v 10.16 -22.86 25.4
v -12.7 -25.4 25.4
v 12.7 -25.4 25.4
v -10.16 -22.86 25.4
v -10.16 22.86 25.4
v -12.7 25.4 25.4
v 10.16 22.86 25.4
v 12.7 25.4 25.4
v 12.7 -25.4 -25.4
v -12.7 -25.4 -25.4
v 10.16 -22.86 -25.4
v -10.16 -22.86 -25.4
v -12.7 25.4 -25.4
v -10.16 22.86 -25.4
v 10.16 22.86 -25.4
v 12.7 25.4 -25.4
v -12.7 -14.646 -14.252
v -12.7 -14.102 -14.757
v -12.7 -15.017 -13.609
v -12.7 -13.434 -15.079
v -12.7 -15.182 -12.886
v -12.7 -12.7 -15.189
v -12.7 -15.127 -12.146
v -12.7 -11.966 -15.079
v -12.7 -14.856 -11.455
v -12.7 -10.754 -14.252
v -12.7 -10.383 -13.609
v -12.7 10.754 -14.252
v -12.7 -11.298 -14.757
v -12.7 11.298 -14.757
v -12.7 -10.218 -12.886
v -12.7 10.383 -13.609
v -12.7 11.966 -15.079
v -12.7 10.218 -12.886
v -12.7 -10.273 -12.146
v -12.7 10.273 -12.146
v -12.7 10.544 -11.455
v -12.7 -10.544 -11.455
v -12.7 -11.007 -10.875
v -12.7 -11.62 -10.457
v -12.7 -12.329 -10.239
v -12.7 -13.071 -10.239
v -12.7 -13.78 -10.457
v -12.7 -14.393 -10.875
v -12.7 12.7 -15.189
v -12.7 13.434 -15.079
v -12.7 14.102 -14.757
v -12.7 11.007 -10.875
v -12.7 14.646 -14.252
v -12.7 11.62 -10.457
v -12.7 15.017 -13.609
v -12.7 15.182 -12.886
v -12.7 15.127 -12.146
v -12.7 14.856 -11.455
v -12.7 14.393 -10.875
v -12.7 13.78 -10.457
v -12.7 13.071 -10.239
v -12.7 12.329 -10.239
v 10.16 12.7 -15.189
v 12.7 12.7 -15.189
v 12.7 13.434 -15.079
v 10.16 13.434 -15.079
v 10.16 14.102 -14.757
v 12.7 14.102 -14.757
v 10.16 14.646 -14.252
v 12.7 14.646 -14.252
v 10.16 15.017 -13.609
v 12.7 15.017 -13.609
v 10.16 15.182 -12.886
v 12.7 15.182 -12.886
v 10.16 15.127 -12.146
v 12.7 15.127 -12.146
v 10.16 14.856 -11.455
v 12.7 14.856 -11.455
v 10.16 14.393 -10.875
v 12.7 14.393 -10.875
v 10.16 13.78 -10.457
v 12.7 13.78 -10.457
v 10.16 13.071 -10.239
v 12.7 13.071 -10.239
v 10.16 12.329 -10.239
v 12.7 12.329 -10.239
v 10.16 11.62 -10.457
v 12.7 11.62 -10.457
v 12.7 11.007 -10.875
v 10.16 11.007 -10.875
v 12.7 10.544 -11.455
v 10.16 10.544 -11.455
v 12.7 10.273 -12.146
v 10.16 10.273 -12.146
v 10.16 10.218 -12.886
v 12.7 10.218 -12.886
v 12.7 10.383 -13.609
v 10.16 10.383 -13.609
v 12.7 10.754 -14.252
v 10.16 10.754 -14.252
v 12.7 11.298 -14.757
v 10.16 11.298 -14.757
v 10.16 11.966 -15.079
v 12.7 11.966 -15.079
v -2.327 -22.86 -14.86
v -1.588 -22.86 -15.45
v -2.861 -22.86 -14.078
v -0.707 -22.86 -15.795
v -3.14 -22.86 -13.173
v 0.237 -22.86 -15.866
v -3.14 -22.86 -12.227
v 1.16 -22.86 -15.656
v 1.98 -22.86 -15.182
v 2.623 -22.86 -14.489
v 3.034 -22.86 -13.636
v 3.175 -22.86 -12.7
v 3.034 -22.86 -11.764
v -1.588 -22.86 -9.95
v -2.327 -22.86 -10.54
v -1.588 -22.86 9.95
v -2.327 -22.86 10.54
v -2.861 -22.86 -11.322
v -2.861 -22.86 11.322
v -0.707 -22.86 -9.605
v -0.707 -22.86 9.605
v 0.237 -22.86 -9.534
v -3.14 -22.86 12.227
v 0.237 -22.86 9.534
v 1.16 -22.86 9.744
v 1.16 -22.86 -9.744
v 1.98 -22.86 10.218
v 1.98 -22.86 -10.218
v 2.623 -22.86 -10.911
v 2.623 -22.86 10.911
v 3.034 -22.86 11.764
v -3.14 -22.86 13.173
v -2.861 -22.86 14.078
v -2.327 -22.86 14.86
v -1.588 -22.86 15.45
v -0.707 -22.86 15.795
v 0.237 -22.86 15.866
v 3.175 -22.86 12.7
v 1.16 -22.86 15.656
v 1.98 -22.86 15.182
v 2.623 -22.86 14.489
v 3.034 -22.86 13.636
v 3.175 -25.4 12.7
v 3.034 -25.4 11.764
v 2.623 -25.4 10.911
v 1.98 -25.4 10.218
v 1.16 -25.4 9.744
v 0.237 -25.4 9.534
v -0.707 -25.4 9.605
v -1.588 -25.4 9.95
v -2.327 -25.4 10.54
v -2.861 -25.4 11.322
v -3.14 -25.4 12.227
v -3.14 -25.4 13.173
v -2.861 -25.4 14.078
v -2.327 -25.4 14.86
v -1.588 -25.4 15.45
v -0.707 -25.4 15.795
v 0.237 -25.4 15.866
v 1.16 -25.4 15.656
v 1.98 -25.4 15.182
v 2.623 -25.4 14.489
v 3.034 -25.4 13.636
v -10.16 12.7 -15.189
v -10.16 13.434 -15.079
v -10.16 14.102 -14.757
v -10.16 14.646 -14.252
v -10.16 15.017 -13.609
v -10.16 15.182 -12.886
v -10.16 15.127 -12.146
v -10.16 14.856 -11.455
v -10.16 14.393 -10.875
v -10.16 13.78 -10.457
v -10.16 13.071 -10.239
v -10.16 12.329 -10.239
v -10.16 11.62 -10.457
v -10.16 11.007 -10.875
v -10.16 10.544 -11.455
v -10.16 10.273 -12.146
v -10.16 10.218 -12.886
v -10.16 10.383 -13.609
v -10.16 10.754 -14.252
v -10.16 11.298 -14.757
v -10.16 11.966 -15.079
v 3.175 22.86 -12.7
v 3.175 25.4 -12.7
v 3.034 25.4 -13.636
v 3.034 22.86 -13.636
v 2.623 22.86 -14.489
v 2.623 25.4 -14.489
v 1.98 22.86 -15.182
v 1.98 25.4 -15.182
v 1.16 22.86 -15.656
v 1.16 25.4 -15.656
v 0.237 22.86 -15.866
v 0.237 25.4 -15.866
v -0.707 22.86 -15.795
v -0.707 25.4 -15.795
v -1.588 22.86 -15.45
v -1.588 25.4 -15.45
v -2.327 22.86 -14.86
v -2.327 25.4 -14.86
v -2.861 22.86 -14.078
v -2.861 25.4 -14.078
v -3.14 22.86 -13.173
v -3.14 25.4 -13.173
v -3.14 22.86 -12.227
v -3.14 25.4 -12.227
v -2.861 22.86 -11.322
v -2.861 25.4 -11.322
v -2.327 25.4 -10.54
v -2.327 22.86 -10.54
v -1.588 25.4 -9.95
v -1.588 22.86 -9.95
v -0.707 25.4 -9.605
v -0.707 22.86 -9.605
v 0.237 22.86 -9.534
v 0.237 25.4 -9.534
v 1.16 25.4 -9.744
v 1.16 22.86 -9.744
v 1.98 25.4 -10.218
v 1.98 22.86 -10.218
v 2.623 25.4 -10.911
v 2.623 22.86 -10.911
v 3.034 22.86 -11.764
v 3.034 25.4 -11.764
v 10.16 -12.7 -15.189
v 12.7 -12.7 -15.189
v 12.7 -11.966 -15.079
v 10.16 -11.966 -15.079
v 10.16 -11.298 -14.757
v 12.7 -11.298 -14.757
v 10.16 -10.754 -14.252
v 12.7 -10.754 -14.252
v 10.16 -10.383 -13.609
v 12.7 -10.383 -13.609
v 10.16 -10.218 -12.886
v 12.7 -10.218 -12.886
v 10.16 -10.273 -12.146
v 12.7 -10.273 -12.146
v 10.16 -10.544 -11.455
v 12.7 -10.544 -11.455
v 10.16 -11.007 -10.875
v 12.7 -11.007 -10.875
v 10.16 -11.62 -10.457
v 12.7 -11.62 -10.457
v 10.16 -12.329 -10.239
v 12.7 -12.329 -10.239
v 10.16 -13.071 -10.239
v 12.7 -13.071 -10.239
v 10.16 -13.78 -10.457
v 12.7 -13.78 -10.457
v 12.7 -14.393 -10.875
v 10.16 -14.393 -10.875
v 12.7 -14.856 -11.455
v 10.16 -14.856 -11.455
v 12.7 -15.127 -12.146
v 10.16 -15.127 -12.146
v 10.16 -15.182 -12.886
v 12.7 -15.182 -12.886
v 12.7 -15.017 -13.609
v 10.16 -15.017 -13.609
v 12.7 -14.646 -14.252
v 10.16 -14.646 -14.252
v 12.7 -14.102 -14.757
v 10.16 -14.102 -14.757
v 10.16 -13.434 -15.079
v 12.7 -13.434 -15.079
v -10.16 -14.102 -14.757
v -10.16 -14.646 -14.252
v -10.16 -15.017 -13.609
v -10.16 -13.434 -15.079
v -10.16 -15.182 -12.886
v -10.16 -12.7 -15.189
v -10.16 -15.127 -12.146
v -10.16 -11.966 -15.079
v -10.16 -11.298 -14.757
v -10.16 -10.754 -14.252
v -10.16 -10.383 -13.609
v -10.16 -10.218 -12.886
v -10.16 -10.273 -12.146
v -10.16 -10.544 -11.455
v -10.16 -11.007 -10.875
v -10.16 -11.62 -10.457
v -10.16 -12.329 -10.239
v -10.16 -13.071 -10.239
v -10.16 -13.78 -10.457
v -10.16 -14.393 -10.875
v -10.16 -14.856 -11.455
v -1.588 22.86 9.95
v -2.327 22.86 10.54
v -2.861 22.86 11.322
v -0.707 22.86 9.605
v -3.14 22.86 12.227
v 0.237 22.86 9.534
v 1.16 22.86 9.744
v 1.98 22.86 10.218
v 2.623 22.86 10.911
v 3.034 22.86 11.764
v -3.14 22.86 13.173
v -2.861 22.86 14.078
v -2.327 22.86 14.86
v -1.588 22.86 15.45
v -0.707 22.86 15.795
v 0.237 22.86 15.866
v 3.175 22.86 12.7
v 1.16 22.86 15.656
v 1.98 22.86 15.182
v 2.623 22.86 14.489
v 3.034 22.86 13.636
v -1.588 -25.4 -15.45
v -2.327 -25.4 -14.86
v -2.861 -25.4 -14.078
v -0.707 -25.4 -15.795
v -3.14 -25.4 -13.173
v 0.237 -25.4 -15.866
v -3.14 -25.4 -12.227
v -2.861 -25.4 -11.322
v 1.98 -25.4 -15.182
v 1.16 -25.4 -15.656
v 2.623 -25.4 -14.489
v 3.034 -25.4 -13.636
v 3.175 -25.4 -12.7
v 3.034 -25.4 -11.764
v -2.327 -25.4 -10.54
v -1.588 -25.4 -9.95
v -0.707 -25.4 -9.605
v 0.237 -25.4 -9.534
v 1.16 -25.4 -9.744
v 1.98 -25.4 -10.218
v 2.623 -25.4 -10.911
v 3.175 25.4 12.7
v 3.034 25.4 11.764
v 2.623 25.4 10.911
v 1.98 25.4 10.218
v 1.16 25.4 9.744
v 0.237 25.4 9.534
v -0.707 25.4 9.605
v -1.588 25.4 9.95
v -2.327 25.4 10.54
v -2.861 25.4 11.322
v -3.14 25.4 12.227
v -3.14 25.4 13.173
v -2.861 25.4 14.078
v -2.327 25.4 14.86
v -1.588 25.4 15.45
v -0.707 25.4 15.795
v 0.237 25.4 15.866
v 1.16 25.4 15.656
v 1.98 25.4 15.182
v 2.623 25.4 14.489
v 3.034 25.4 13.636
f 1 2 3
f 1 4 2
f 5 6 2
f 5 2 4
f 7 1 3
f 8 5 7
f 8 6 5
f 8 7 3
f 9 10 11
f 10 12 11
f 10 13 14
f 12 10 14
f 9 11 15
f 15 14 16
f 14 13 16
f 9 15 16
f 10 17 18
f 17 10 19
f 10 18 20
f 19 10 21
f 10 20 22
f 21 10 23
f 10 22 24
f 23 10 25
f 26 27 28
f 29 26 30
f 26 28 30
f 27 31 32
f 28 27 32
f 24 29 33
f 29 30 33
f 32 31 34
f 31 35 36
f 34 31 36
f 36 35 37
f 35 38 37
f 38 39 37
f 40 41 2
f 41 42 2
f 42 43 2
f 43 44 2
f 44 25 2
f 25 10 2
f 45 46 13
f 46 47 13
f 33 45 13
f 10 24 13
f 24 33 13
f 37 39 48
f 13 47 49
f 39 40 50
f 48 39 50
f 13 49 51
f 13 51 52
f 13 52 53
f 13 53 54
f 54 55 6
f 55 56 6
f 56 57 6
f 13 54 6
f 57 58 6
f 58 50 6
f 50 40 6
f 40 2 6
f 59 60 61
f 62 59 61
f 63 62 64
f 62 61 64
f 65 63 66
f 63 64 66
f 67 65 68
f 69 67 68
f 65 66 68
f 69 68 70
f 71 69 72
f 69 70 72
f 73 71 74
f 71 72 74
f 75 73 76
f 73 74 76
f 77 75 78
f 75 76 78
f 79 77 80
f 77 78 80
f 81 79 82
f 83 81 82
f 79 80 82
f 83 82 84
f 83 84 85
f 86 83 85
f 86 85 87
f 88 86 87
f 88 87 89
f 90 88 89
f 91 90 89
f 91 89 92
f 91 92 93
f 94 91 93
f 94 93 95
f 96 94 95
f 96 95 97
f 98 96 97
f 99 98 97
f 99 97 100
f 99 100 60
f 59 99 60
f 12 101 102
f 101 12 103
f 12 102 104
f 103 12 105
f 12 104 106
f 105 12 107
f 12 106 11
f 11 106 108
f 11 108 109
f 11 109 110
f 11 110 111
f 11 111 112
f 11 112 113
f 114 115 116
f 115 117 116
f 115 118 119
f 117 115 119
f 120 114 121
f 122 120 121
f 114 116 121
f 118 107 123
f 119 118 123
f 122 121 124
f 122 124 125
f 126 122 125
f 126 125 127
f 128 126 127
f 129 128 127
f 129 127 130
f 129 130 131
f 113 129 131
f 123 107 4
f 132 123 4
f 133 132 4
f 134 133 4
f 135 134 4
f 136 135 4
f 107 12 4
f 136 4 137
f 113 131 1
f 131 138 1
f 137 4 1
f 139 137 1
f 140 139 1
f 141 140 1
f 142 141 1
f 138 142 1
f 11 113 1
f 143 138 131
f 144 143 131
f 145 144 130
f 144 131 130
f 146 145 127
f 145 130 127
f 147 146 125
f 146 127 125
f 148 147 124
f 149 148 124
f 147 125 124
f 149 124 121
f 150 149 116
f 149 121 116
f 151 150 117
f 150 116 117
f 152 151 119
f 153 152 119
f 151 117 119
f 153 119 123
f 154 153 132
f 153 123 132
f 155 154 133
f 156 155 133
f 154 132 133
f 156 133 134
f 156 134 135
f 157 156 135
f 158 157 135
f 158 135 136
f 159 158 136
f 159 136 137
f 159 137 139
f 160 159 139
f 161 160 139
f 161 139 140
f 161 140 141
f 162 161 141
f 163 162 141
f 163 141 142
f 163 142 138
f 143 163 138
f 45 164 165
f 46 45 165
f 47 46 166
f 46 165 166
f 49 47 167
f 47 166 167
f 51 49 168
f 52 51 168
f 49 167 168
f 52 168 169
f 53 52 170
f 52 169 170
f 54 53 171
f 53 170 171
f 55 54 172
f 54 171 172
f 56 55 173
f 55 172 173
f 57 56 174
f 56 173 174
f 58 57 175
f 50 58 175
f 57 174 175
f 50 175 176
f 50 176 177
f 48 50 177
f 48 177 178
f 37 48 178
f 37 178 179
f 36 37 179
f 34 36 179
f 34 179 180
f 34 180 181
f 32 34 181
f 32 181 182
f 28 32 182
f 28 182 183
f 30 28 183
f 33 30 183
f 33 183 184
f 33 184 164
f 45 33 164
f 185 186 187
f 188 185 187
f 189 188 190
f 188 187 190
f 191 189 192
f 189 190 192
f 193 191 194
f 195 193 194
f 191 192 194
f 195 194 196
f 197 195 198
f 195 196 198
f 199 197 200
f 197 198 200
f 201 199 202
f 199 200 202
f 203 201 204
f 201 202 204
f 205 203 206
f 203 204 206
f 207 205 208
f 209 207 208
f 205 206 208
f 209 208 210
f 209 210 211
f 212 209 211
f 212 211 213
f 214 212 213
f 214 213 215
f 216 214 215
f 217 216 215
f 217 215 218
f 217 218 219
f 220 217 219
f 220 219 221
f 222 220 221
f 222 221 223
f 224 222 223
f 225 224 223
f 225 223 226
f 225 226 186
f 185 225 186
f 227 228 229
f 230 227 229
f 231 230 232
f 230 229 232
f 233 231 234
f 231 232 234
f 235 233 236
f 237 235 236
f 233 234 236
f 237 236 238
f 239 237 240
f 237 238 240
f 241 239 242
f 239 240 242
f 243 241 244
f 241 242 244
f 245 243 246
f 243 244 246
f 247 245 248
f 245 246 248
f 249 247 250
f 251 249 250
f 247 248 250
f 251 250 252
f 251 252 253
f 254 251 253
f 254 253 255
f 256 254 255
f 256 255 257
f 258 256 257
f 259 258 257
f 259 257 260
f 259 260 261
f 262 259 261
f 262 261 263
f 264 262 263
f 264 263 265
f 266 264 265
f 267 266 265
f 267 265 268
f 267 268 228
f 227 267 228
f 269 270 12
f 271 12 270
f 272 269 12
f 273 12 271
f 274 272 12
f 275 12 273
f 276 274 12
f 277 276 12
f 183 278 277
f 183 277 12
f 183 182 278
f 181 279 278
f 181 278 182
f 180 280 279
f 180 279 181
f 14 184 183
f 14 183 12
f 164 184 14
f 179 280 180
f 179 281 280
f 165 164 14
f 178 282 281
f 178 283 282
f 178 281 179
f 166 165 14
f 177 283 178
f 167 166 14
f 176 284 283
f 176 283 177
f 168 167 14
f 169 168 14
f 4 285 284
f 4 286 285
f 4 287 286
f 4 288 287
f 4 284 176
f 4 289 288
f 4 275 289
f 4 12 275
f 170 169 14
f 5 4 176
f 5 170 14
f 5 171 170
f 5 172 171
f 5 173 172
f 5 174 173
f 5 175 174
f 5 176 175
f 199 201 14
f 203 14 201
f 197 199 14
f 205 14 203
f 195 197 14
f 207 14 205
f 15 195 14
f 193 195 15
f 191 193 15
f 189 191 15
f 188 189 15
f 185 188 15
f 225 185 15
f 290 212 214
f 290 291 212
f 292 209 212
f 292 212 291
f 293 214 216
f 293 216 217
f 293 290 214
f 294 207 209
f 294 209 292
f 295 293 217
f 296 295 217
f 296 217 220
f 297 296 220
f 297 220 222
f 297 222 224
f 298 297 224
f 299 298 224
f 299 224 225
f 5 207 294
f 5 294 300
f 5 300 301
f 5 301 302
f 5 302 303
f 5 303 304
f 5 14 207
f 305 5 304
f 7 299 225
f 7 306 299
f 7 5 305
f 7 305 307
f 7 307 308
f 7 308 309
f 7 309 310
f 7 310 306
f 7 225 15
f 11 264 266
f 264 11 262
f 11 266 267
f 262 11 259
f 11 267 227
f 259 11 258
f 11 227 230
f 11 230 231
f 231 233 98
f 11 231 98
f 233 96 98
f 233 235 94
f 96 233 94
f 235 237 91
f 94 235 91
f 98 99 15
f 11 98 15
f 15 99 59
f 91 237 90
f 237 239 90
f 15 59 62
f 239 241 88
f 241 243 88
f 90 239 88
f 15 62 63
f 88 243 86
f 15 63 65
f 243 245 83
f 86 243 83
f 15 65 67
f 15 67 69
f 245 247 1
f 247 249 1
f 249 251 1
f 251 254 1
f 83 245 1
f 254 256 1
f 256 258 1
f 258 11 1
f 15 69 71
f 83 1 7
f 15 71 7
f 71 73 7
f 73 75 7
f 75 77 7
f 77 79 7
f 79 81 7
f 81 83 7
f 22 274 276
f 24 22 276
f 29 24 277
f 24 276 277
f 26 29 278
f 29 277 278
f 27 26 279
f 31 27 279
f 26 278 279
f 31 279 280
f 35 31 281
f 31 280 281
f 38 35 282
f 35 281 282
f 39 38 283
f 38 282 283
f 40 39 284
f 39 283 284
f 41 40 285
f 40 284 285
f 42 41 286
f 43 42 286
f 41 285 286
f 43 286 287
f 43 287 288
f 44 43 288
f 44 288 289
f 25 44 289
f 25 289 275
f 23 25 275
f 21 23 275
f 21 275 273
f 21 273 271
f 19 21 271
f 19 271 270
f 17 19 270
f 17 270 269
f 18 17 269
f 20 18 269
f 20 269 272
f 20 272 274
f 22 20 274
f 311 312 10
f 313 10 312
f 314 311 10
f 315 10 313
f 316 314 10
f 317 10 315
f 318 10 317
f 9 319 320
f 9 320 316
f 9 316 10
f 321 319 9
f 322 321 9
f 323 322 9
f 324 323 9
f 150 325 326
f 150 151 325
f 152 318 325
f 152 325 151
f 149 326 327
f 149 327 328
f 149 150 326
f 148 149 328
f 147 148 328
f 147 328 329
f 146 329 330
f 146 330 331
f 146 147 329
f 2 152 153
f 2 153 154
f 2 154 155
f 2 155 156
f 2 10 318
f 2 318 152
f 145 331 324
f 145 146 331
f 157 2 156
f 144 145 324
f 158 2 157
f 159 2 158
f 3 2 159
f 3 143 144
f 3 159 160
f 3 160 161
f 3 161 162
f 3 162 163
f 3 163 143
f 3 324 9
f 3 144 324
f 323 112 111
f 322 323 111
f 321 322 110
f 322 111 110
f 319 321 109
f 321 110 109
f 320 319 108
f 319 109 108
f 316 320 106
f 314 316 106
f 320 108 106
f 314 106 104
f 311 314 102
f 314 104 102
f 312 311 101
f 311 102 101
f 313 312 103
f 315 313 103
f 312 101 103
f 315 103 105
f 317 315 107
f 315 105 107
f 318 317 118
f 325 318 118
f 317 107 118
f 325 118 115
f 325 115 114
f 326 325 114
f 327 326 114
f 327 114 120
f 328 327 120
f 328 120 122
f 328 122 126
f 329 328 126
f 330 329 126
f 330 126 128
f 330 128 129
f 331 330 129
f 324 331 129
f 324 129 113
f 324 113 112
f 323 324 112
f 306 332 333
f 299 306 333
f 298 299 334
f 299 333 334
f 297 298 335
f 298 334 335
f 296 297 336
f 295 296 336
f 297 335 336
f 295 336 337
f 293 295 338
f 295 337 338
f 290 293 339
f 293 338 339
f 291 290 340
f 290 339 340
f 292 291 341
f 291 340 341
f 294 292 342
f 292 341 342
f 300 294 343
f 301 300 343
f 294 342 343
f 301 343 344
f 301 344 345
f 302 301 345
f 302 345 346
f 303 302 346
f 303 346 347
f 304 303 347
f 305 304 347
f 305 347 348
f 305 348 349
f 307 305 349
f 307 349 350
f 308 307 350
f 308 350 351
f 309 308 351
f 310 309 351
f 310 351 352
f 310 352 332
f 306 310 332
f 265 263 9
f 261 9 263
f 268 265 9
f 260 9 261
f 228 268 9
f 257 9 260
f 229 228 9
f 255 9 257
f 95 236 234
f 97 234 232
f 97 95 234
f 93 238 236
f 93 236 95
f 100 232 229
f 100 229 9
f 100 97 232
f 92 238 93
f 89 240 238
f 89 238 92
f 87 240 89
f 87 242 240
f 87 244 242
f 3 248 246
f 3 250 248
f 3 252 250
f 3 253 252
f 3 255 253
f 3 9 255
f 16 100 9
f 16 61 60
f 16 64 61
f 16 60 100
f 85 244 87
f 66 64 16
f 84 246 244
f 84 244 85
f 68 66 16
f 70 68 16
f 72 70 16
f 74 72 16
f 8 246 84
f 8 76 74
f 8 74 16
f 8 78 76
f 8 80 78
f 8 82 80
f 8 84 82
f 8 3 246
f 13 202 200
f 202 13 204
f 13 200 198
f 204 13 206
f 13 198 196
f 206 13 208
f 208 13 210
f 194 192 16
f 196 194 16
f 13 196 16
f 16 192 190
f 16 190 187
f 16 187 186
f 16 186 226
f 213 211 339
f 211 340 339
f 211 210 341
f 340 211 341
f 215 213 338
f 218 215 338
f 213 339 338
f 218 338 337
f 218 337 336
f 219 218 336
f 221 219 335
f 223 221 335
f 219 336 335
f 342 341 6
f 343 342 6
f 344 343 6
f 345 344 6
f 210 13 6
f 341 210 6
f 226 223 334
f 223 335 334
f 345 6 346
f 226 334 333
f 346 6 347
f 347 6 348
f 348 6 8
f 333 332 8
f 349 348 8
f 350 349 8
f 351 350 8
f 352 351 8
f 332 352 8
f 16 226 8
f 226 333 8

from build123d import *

# Parameters (mm, degrees)
SKETCH1_W           = 25.4
SKETCH1_H           = 50.8
SKETCH1_W_2         = 20.32
SKETCH1_H_2         = 45.72
EXTRUDE_THIN1_DEPTH = 25.4
SKETCH2_R           = 3.175
CUT_EXTRUDE1_DEPTH  = 51.8
SKETCH3_R           = 2.4892
CUT_EXTRUDE2_DEPTH  = 26.4


with BuildPart() as part:
    # Sketch1 → Extrude-Thin1 (new body, symmetric)
    with BuildSketch(Plane.XY):
        Rectangle(SKETCH1_W, SKETCH1_H)
        Rectangle(SKETCH1_W_2, SKETCH1_H_2, mode=Mode.SUBTRACT)
    extrude(amount=EXTRUDE_THIN1_DEPTH, both=True)

    # Sketch2 → Cut-Extrude1 (cut, through all)
    with BuildSketch(Plane(origin=(0, 25.4, 0), x_dir=(1, 0, 0), z_dir=(0, 1, 0))):
        with Locations((0, 12.7)):
            Circle(SKETCH2_R)
        with Locations((0, -12.7)):
            Circle(SKETCH2_R)
    extrude(amount=-CUT_EXTRUDE1_DEPTH, mode=Mode.SUBTRACT)

    # Sketch3 → Cut-Extrude2 (cut, through all)
    with BuildSketch(Plane(origin=(12.7, 0, 0), x_dir=(0, 0, -1), z_dir=(1, 0, 0))):
        with Locations((12.7, 12.7)):
            Circle(SKETCH3_R)
        with Locations((12.7, -12.7)):
            Circle(SKETCH3_R)
    extrude(amount=-CUT_EXTRUDE2_DEPTH, mode=Mode.SUBTRACT)


solid = part.part
